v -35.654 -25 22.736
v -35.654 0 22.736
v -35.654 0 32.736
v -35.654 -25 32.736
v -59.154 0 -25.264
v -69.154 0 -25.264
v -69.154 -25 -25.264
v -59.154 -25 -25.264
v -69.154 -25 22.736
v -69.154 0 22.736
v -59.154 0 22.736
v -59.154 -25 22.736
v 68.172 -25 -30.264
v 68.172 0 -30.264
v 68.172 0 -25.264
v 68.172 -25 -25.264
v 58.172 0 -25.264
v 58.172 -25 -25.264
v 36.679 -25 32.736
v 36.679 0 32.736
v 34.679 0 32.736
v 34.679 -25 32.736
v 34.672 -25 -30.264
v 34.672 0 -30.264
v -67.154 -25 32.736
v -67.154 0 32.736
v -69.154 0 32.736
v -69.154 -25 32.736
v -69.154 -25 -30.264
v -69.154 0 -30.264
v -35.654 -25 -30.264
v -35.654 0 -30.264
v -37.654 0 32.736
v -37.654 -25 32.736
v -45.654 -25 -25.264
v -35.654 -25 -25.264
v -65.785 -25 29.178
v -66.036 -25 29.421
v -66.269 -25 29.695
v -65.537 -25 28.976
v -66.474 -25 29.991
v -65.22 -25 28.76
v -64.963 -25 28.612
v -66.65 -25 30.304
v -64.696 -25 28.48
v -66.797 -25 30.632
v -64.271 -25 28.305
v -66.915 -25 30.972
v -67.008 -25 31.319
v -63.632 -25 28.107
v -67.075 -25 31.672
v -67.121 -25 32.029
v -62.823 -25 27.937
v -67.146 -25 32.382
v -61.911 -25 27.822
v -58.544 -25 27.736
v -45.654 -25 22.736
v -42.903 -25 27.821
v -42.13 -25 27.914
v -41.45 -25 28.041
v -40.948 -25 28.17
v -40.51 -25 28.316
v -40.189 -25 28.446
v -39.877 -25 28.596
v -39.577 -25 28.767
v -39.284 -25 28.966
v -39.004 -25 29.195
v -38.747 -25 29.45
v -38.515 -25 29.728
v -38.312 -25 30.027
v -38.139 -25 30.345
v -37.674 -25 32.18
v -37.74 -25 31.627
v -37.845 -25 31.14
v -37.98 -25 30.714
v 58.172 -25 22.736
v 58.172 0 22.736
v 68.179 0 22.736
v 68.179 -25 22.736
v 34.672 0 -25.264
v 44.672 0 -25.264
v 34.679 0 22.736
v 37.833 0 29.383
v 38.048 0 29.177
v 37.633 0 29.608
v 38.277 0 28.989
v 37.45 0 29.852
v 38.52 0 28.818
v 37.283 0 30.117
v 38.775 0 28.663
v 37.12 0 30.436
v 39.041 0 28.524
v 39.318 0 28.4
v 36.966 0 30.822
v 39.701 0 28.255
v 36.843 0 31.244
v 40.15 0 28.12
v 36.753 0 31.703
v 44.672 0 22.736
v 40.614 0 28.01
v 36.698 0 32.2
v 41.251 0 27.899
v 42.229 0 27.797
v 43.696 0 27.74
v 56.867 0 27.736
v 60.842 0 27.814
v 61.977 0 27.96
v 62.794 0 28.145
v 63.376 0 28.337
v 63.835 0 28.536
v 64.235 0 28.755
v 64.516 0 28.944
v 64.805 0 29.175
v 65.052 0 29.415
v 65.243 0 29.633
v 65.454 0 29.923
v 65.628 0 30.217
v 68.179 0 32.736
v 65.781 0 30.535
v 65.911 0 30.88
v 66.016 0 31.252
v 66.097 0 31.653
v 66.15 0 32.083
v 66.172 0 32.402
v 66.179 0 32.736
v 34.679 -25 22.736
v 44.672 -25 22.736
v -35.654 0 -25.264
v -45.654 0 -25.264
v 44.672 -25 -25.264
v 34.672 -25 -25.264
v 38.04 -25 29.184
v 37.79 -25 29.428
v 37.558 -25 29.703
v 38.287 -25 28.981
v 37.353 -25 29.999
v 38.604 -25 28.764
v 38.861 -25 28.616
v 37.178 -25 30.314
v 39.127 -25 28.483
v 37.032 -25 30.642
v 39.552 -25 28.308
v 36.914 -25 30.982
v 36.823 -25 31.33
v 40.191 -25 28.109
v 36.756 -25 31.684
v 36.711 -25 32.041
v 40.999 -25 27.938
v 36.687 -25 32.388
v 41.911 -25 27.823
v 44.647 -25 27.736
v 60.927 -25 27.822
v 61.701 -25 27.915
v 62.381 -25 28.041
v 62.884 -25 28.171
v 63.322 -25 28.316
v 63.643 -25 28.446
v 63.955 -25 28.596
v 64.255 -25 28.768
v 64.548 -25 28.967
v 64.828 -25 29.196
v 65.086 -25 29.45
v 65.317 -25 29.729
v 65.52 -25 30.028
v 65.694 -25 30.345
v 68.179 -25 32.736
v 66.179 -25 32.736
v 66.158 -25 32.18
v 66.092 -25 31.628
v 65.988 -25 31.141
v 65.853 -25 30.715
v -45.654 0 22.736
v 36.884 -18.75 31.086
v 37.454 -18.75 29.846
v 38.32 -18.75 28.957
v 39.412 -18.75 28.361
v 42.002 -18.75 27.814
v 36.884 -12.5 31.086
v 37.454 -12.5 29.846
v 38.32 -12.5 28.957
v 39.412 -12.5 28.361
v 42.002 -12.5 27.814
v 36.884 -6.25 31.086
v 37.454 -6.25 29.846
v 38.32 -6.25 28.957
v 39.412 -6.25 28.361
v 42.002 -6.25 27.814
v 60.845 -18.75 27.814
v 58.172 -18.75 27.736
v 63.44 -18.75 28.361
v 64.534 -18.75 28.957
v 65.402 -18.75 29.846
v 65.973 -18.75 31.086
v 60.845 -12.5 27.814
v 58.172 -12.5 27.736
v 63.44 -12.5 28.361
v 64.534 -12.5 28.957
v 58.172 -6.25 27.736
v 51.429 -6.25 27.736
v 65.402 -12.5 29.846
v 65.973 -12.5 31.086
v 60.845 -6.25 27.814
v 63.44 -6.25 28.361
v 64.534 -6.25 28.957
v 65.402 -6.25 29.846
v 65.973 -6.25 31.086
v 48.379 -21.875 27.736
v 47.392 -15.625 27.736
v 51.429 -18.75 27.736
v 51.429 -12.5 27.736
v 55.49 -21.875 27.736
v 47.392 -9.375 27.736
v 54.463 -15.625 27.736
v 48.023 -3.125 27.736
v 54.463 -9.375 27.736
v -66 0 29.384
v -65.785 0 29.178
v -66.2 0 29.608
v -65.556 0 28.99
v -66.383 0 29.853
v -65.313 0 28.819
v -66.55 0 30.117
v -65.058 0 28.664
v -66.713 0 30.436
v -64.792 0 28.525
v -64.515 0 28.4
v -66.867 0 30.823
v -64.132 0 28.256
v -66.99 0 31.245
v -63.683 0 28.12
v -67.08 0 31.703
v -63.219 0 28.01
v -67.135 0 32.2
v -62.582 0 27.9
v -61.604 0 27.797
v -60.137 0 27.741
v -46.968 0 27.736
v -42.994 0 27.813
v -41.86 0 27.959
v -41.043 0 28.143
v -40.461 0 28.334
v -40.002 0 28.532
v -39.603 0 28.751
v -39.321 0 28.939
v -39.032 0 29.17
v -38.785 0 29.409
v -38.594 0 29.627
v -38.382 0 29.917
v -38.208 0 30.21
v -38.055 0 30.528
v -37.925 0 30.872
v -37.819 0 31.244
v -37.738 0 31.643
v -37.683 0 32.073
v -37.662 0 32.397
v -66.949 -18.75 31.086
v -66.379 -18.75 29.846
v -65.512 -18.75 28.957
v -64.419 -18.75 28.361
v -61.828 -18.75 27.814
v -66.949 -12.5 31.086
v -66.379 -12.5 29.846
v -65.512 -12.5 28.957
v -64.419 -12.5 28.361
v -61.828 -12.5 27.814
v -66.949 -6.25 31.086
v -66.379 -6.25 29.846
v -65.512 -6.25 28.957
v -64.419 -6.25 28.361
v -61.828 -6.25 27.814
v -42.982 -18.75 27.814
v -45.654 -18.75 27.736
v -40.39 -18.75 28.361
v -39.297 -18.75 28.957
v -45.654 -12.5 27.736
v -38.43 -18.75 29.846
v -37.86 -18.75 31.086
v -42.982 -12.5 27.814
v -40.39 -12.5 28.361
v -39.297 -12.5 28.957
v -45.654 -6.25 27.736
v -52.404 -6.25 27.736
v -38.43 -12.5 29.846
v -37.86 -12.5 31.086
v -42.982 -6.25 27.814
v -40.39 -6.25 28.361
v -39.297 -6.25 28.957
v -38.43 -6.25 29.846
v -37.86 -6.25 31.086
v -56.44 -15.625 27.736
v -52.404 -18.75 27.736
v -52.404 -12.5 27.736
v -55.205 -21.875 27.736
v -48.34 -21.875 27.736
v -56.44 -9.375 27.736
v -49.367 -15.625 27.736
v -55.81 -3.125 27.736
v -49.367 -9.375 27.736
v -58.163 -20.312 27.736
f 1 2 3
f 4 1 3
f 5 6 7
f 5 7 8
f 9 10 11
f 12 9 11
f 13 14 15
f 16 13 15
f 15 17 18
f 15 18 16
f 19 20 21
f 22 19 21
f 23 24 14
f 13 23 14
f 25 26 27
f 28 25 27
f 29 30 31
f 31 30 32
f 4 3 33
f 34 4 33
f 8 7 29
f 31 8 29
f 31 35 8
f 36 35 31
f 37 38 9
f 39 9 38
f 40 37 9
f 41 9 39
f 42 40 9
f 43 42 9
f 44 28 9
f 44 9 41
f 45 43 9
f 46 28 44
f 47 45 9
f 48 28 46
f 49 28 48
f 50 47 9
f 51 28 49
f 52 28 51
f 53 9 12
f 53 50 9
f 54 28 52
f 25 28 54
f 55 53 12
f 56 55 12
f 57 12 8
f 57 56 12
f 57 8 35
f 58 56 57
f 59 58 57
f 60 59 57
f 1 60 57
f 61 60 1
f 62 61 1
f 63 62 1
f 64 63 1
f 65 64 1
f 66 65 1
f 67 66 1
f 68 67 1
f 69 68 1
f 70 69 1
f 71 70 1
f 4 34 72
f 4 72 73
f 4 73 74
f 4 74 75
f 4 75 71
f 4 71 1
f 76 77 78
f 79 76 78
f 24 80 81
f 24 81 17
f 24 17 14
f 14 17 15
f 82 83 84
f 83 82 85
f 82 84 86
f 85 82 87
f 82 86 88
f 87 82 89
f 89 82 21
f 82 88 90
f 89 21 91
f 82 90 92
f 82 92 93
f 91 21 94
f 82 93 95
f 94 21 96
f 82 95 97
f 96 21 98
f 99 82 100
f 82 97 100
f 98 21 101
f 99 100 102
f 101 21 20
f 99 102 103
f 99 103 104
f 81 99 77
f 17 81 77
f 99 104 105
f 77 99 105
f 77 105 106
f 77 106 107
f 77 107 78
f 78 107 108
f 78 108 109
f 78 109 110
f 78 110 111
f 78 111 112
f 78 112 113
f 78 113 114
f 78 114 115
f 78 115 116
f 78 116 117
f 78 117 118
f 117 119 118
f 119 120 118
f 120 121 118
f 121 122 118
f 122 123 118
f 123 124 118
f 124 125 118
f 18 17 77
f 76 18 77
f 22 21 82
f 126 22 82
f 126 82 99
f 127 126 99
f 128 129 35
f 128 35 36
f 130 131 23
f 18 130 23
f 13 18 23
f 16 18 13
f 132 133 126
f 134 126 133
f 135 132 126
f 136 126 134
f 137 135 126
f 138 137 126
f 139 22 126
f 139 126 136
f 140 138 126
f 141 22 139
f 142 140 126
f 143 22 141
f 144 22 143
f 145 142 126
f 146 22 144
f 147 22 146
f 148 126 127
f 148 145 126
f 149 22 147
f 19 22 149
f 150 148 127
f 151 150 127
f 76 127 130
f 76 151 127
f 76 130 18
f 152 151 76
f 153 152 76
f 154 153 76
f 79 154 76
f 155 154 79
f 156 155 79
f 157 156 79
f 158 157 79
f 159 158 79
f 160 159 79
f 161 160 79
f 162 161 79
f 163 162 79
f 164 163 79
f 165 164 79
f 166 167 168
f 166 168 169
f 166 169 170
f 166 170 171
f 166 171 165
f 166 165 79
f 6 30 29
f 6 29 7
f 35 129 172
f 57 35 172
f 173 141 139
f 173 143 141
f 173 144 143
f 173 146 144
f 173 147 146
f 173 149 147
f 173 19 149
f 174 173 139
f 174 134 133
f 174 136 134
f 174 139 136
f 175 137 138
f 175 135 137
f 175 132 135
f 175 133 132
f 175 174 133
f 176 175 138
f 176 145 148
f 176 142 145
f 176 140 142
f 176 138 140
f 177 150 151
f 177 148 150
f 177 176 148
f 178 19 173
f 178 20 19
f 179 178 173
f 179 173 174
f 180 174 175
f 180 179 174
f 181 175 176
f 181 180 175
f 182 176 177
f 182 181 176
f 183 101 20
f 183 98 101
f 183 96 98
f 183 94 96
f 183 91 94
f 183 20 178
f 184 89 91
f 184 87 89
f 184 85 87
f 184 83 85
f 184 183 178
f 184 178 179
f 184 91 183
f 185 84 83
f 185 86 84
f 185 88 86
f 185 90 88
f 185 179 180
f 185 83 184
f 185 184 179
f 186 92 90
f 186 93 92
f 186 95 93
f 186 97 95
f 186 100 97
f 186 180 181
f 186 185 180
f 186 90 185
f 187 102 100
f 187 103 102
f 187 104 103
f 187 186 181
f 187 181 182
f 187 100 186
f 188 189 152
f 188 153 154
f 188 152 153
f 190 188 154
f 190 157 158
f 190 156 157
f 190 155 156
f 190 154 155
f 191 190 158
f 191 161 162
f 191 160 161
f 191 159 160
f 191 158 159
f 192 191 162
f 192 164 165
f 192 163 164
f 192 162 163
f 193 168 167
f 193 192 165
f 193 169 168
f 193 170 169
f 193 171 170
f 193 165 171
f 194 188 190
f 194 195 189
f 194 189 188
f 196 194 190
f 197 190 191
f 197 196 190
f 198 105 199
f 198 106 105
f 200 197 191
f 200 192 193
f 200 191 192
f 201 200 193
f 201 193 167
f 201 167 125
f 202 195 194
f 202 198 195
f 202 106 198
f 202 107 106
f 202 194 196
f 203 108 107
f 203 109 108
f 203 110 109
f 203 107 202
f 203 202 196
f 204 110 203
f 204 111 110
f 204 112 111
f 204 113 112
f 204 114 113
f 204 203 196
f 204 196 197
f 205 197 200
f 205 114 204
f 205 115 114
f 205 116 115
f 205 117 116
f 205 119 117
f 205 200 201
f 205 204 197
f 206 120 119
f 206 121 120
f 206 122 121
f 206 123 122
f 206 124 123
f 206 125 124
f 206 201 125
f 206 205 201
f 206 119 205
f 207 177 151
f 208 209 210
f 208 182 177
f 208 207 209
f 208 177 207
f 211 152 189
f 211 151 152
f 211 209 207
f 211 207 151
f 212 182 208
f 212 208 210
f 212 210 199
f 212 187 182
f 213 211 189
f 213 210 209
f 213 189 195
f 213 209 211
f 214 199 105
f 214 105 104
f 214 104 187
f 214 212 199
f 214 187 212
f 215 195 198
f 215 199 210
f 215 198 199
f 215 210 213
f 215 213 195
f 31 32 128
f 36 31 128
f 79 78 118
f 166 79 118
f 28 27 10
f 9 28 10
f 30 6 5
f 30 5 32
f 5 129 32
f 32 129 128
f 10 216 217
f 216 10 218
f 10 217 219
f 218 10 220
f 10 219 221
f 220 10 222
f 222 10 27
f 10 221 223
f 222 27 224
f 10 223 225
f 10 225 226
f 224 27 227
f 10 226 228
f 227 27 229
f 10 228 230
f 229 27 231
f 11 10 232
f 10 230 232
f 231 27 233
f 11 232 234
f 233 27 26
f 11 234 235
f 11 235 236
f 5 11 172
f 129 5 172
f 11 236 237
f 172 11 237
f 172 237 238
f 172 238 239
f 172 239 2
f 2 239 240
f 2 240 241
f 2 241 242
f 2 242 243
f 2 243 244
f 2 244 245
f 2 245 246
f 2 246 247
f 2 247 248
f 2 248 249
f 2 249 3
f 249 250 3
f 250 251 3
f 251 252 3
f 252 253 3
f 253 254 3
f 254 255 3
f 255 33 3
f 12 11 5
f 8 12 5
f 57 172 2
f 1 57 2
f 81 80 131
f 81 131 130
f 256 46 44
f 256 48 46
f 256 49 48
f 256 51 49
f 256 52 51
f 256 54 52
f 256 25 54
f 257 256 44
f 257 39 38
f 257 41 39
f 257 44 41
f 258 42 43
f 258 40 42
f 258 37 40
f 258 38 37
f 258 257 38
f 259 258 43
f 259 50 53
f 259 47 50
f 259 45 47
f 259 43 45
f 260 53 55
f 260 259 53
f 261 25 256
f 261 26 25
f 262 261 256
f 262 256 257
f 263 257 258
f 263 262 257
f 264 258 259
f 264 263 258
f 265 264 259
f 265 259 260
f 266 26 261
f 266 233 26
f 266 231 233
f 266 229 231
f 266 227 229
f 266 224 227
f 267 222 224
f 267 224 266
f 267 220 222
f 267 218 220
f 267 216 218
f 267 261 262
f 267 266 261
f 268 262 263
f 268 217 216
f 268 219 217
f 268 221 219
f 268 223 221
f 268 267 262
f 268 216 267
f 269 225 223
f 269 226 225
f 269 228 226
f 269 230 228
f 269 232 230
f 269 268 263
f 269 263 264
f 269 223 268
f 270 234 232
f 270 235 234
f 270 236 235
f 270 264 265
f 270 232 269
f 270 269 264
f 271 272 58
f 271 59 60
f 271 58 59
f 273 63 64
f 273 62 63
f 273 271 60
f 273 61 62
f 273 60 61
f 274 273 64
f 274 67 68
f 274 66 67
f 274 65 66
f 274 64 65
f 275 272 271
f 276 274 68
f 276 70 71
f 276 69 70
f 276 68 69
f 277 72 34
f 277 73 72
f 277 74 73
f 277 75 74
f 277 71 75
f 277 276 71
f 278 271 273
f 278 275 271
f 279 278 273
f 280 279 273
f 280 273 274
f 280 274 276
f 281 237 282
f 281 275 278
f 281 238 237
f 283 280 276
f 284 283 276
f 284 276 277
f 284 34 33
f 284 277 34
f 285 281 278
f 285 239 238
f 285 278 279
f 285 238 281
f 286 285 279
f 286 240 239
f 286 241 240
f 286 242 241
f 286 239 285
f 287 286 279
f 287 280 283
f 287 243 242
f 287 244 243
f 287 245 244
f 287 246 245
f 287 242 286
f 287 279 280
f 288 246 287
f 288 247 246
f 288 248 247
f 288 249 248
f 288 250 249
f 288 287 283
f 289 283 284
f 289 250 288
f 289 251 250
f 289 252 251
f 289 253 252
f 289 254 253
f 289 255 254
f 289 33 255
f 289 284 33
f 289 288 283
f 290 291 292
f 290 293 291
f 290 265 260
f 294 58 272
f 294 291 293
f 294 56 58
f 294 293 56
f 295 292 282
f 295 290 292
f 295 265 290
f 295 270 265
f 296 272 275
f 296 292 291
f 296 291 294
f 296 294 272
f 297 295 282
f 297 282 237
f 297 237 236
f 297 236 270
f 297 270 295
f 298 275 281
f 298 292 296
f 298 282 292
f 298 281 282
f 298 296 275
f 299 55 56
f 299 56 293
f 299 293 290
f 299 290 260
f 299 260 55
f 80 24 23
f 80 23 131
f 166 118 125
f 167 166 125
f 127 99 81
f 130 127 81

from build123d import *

# Parameters (mm, degrees)
F0_W     = 13.5
F0_H     = 48
F0_H_2   = 5
F0_W_2   = 10
F1_DEPTH = 25
F2_DEPTH = 207


# Not quite as in the source:
# - an extrude ends at something that could not be found from the text; its depth is read off the source's solid


with BuildPart() as f1:
    # F0 (on Front) → F1 (new body)
    with BuildSketch(Plane.XZ):
        with BuildLine():
            Line((-67.1541336304, 32.7363717356), (-69.1541336304, 32.7363717356))
            Line((-69.1541336304, 32.7363717356), (-69.1541336304, 22.7363717356))
            Line((-69.1541336304, 22.7363717356), (-59.1541336304, 22.7363717356))
            Line((-59.1541336304, 22.7363717356), (-45.6541336304, 22.7363717356))
            Line((-45.6541336304, 22.7363717356), (-35.6541336304, 22.7363717356))
            Line((-35.6541336304, 22.7363717356), (-35.6541336304, 32.7363717356))
            Line((-35.6541336304, 32.7363717356), (-37.6541336304, 32.7363717356))
            add(Edge.make_bspline(
                [(-67.1541336304, 32.7363717356), (-67.1541336304, 27.7363717356), (-58.6117428449, 27.7363717356), (-52.4038602705, 27.7363717356), (-46.2003270582, 27.7363717356), (-37.6541336304, 27.7363717356), (-37.6541336304, 32.7363717356)],
                knots=[0, 0, 0, 0, 0.2708316482, 0.5000076733, 0.7291293946, 1, 1, 1, 1], degree=3))
        make_face()
        with BuildLine():
            Line((-37.6541336304, 32.7363717356), (-67.1541336304, 32.7363717356))
            add(Edge.make_bspline(
                [(-67.1541336304, 32.7363717356), (-67.1541336304, 27.7363717356), (-58.6117428449, 27.7363717356), (-52.4038602705, 27.7363717356), (-46.2003270582, 27.7363717356), (-37.6541336304, 27.7363717356), (-37.6541336304, 32.7363717356)],
                knots=[0, 0, 0, 0, 0.2708316482, 0.5000076733, 0.7291293946, 1, 1, 1, 1], degree=3))
        make_face()
        with Locations((-52.4041336304, -1.2636282644)):
            Rectangle(F0_W, F0_H)
        with Locations((-52.4041336304, -27.7636282644)):
            Rectangle(F0_W, F0_H_2)
        with Locations((-64.1541336304, -27.7636282644)):
            Rectangle(F0_W_2, F0_H_2)
        with Locations((-40.6541336304, -27.7636282644)):
            Rectangle(F0_W_2, F0_H_2)
    extrude(amount=F1_DEPTH)


with BuildPart() as f1b:
    # F0 (on Front) → F1, piece 2 (new body)
    with BuildSketch(Plane.XZ):
        with BuildLine():
            Line((36.6787728249, 32.7363717356), (34.6787728249, 32.7363717356))
            Line((34.6787728249, 32.7363717356), (34.6787728249, 22.7363717356))
            Line((34.6787728249, 22.7363717356), (44.6723728249, 22.7363717356))
            Line((44.6723728249, 22.7363717356), (58.1723728249, 22.7363717356))
            Line((58.1723728249, 22.7363717356), (68.1787728249, 22.7363717356))
            Line((68.1787728249, 22.7363717356), (68.1787728249, 32.7363717356))
            Line((68.1787728249, 32.7363717356), (66.1787728249, 32.7363717356))
            add(Edge.make_bspline(
                [(36.6787728249, 32.7363717356), (36.6787728249, 27.7363717356), (45.2171089647, 27.7363717356), (51.4298659754, 27.7363717356), (57.6252269118, 27.7363717356), (66.1787728249, 27.7363717356), (66.1787728249, 32.7363717356)],
                knots=[0, 0, 0, 0, 0.2707968607, 0.5000307078, 0.7290473102, 1, 1, 1, 1], degree=3))
        make_face()
        with BuildLine():
            Line((66.1787728249, 32.7363717356), (36.6787728249, 32.7363717356))
            add(Edge.make_bspline(
                [(36.6787728249, 32.7363717356), (36.6787728249, 27.7363717356), (45.2171089647, 27.7363717356), (51.4298659754, 27.7363717356), (57.6252269118, 27.7363717356), (66.1787728249, 27.7363717356), (66.1787728249, 32.7363717356)],
                knots=[0, 0, 0, 0, 0.2707968607, 0.5000307078, 0.7290473102, 1, 1, 1, 1], degree=3))
        make_face()
        with Locations((51.4223728249, -1.2636282644)):
            Rectangle(F0_W, F0_H)
        with Locations((51.4223728249, -27.7636282644)):
            Rectangle(F0_W, F0_H_2)
        with Locations((39.6723728249, -27.7636282644)):
            Rectangle(F0_W_2, F0_H_2)
        with Locations((63.1723728249, -27.7636282644)):
            Rectangle(F0_W_2, F0_H_2)
    extrude(amount=F1_DEPTH)


with BuildPart() as f2_tool:
    # F1_face (on face) + F0 (on Front) → F2 (new body, through all)
    with BuildSketch(Plane(origin=(-52.4041336304, -25, 3.3224212792), x_dir=(1, 0, 0), z_dir=(0, -1, 0))):
        Polygon((16.75, 29.4139504563), (-16.75, 29.4139504563), (-16.75, 19.4139504563), (-6.75, 19.4139504563), (-6.75, -28.5860495437), (-16.75, -28.5860495437), (-16.75, -33.5860495437), (16.75, -33.5860495437), (16.75, -28.5860495437), (6.75, -28.5860495437), (6.75, 19.4139504563), (16.75, 19.4139504563), align=None)
    with BuildSketch(Plane.XZ):
        with BuildLine():
            Line((66.1787728249, 32.7363717356), (36.6787728249, 32.7363717356))
            add(Edge.make_bspline(
                [(36.6787728249, 32.7363717356), (36.6787728249, 27.7363717356), (45.2171089647, 27.7363717356), (51.4298659754, 27.7363717356), (57.6252269118, 27.7363717356), (66.1787728249, 27.7363717356), (66.1787728249, 32.7363717356)],
                knots=[0, 0, 0, 0, 0.2707968607, 0.5000307078, 0.7290473102, 1, 1, 1, 1], degree=3))
        make_face()
        with BuildLine():
            Line((-37.6541336304, 32.7363717356), (-67.1541336304, 32.7363717356))
            add(Edge.make_bspline(
                [(-67.1541336304, 32.7363717356), (-67.1541336304, 27.7363717356), (-58.6117428449, 27.7363717356), (-52.4038602705, 27.7363717356), (-46.2003270582, 27.7363717356), (-37.6541336304, 27.7363717356), (-37.6541336304, 32.7363717356)],
                knots=[0, 0, 0, 0, 0.2708316482, 0.5000076733, 0.7291293946, 1, 1, 1, 1], degree=3))
        make_face()
    extrude(amount=F2_DEPTH)


with BuildPart() as f1_1:
    add(f1.part)

    # F2: cut by f2_tool
    add(f2_tool.part, mode=Mode.SUBTRACT)


with BuildPart() as f1b_1:
    add(f1b.part)

    # F2: cut by f2_tool
    add(f2_tool.part, mode=Mode.SUBTRACT)


solid = Compound([f1_1.part, f1b_1.part])
